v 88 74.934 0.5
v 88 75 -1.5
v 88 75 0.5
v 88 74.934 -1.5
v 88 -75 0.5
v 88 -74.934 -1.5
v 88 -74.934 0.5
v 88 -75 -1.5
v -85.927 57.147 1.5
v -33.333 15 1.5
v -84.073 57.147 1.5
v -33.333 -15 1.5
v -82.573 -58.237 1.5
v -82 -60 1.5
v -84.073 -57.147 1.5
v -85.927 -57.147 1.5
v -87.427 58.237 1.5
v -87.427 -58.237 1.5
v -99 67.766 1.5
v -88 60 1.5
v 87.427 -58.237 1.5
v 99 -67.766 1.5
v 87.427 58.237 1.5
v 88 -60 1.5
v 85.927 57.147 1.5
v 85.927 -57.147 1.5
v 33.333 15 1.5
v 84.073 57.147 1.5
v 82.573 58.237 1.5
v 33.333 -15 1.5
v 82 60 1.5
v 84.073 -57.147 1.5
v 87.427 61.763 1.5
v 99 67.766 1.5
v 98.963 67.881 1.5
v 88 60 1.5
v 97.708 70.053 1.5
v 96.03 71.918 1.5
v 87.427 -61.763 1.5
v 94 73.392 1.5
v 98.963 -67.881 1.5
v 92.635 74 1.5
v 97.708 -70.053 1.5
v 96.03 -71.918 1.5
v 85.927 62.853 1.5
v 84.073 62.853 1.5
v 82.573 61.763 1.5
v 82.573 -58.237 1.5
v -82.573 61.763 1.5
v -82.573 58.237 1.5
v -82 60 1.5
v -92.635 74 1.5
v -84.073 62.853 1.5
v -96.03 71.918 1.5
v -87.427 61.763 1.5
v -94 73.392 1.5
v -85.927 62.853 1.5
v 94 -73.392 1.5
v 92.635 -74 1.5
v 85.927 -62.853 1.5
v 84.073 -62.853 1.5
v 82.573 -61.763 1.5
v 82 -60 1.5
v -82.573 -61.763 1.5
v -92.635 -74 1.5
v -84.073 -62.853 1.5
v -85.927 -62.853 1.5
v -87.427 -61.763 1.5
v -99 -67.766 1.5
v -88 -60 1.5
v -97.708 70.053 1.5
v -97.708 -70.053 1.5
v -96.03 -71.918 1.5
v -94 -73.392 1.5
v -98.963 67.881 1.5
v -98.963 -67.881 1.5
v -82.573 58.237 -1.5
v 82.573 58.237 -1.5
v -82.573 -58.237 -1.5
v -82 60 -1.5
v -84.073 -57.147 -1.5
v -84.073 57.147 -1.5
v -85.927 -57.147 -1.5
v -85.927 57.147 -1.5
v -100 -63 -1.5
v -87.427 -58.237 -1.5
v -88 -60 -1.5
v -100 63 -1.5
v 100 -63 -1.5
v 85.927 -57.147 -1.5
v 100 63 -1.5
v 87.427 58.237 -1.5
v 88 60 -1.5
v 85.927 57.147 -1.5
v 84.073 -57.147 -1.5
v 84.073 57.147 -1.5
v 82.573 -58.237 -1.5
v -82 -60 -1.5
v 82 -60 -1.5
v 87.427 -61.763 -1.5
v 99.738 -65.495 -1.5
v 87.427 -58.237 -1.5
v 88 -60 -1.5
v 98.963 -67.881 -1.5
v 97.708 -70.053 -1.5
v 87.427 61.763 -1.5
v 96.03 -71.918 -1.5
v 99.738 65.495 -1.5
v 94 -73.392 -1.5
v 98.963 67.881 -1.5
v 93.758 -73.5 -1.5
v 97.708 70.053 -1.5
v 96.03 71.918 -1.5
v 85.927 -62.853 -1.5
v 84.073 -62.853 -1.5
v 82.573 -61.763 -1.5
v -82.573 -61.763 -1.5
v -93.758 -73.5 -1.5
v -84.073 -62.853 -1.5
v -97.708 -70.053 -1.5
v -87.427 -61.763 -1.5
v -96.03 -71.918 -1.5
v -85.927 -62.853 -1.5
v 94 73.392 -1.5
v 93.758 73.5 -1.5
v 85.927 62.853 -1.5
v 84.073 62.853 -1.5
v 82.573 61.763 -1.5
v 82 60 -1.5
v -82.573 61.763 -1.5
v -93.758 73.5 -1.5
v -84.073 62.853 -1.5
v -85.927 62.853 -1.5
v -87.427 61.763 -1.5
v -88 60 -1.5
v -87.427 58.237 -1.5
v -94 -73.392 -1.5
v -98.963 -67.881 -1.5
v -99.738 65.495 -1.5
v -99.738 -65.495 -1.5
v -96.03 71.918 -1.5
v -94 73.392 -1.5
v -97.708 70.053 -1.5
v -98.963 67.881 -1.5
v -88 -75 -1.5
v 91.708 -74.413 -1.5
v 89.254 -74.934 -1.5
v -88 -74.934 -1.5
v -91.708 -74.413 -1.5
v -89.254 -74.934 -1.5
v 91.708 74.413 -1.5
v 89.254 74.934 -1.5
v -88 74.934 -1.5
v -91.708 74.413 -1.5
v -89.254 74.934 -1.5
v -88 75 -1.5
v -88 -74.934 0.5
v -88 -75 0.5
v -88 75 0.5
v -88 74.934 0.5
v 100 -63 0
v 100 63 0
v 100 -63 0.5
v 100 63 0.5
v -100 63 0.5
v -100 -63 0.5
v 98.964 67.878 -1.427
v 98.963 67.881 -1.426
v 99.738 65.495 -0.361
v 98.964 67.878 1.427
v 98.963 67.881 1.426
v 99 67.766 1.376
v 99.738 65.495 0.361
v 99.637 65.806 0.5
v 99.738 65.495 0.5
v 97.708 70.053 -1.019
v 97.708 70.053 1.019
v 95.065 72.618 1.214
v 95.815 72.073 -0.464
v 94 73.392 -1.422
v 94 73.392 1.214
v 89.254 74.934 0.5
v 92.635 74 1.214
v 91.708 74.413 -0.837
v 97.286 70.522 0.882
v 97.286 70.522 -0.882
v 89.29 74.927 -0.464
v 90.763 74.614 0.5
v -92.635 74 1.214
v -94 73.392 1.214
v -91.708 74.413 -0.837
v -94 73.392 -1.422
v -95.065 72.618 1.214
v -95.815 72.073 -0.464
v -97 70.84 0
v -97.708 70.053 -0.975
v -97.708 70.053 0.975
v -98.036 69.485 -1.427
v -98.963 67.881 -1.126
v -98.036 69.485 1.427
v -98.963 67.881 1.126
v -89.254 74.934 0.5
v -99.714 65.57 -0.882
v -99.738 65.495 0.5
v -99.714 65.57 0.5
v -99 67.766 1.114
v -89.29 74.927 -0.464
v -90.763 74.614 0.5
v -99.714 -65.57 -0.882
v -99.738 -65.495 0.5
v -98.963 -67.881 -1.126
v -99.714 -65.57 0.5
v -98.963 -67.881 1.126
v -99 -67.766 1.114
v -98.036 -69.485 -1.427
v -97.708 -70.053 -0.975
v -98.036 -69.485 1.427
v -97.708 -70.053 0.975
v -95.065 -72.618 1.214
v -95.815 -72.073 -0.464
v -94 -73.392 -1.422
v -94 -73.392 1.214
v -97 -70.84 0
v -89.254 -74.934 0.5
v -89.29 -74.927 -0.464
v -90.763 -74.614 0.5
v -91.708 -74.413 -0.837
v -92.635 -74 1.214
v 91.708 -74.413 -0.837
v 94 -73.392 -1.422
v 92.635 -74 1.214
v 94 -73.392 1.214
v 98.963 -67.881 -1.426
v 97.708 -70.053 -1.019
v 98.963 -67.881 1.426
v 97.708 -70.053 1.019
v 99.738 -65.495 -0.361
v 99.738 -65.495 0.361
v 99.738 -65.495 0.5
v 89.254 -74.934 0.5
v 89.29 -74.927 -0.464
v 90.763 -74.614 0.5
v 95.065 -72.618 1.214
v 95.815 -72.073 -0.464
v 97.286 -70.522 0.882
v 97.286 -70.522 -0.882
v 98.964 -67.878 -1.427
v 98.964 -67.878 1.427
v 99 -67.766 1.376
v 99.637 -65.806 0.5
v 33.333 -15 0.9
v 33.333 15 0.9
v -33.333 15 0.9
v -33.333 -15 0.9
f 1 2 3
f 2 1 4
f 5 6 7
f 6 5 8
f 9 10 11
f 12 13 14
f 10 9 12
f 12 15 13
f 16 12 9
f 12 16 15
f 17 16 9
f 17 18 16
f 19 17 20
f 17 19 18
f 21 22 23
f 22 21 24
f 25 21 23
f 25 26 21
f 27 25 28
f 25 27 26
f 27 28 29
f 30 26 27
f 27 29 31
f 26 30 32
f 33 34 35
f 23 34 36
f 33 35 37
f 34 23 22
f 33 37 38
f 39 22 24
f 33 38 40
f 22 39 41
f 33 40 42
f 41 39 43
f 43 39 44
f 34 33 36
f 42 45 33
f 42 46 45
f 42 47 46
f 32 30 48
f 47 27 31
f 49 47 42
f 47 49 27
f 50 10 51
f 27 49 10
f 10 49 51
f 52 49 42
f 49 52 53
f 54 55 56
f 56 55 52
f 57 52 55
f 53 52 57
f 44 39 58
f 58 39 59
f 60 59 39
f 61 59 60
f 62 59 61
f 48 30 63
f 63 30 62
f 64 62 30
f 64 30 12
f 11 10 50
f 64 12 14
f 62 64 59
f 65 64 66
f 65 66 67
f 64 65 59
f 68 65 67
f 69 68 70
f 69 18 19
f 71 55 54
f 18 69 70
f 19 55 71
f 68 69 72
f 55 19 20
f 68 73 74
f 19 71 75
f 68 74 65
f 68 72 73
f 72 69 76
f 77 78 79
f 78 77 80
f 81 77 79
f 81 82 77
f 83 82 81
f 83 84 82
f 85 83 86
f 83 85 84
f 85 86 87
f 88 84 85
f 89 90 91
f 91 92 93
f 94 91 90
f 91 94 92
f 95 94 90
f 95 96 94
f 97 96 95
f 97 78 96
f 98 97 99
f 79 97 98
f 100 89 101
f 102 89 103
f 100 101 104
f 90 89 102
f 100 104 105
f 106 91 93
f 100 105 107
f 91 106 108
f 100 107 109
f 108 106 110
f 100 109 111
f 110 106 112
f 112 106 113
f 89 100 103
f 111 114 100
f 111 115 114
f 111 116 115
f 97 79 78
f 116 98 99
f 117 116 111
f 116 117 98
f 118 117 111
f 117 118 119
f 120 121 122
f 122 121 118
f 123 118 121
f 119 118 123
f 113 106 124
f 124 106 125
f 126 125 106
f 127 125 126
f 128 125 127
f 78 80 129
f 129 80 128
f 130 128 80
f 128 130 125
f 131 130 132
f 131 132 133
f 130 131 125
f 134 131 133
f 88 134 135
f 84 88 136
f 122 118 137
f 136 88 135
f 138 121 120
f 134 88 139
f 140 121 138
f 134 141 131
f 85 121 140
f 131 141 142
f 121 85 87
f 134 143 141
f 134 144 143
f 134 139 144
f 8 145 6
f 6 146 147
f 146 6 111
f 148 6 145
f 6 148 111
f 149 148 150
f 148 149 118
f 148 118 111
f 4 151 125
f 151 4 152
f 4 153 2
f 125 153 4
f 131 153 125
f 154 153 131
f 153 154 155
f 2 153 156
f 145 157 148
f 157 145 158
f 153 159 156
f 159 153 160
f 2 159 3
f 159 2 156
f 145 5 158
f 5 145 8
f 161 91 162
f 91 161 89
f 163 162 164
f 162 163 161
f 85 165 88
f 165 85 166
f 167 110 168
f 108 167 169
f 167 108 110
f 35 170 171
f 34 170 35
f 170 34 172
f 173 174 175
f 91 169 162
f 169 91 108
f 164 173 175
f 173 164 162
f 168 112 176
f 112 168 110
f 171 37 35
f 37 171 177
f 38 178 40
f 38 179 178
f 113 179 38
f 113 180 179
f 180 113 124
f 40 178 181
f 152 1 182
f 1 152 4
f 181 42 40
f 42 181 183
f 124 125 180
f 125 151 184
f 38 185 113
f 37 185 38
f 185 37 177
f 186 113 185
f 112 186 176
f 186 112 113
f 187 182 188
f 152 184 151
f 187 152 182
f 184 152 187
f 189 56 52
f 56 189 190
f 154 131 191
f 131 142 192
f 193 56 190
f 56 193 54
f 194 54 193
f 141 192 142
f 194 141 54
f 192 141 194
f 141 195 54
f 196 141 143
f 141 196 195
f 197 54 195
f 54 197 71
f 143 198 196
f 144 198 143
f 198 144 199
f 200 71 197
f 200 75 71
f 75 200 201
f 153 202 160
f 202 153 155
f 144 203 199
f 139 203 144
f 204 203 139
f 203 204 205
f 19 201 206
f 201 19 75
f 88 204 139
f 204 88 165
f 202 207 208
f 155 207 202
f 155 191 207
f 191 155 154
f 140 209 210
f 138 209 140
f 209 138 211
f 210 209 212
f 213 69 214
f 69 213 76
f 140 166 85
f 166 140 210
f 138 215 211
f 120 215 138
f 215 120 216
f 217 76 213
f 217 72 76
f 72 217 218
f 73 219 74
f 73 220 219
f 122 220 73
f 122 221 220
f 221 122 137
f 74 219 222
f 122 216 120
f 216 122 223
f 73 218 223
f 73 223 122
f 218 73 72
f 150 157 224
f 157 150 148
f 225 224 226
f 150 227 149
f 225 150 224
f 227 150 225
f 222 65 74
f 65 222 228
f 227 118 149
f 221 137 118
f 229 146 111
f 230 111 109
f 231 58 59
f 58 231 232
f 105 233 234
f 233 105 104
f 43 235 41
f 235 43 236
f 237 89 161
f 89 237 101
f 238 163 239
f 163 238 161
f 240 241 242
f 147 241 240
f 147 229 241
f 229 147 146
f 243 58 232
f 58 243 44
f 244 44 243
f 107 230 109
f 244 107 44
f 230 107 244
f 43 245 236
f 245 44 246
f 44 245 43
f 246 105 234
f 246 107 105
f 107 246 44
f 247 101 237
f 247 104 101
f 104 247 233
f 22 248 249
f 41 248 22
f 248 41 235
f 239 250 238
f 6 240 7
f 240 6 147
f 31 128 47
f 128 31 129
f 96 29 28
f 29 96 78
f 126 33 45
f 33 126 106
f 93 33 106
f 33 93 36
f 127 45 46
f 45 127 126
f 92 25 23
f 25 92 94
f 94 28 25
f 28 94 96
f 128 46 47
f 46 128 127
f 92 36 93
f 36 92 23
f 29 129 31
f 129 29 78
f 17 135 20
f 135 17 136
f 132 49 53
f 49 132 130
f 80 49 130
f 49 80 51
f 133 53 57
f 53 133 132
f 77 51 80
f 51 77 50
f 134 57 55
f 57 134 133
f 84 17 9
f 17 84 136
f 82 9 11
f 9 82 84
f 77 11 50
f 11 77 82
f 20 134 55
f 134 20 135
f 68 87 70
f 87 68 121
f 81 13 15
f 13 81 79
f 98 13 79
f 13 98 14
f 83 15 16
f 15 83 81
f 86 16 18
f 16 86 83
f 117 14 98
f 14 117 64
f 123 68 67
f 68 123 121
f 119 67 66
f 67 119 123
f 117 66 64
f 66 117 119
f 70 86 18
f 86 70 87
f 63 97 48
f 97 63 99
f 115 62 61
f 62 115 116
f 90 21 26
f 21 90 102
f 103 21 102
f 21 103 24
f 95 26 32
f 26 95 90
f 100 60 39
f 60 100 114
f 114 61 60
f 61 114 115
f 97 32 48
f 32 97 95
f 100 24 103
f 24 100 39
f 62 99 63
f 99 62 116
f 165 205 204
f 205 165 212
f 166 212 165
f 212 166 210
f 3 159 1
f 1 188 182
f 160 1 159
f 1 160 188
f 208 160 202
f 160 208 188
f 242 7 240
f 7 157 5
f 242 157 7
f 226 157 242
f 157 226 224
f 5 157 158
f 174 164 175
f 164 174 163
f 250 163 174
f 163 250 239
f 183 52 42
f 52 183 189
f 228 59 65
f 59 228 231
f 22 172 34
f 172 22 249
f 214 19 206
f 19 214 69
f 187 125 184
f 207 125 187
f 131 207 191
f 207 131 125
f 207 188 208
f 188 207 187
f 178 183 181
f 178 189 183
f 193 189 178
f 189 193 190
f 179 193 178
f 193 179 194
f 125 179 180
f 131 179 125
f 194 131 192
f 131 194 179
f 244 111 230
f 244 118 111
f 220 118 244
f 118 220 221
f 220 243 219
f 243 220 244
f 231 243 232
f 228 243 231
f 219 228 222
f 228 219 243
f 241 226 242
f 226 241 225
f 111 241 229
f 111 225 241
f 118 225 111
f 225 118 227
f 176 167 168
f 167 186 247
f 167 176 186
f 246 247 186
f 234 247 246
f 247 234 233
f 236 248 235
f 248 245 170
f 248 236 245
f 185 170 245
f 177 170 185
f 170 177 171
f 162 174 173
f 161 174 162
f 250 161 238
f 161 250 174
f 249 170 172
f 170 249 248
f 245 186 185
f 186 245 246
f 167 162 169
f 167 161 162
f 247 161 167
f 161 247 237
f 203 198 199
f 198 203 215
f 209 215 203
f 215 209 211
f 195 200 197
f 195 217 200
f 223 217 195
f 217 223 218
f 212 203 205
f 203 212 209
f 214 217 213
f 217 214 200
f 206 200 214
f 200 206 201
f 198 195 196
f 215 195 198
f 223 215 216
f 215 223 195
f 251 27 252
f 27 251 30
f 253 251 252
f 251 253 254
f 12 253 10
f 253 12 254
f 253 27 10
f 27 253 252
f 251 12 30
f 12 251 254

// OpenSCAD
// Parameters
sheet_length = 200; //[100:400:1]
sheet_width = 150; //[75:300:1]
sheet_thickness = 3; //[1.5:6:0.5]
corner_radius = 12; //[6:24:1]
hole_diameter = 6; //[3:12:0.5]
hole_edge_offset = 15; //[8:30:1]
edge_overlap = 1; //[0.5:2:0.5]
chamfer_size = 1; //[0.5:3:0.5]
fillet_radius = 1.5; //[0.5:4:0.5]
surface_text_depth = 0.6; //[0.2:1.5:0.1]

// Base Shapes
module sheet_body() {
  cube([sheet_length, sheet_width, sheet_thickness], center=true);
}

module rounded_corners() {
  union() {
    cube([sheet_length - 2*corner_radius, sheet_width, sheet_thickness], center=true);
    cube([sheet_length, sheet_width - 2*corner_radius, sheet_thickness], center=true);
    translate([sheet_length/2 - corner_radius, sheet_width/2 - corner_radius, 0])
      cylinder(r=corner_radius, h=sheet_thickness, center=true);
    translate([-sheet_length/2 + corner_radius, sheet_width/2 - corner_radius, 0])
      cylinder(r=corner_radius, h=sheet_thickness, center=true);
    translate([-sheet_length/2 + corner_radius, -sheet_width/2 + corner_radius, 0])
      cylinder(r=corner_radius, h=sheet_thickness, center=true);
    translate([sheet_length/2 - corner_radius, -sheet_width/2 + corner_radius, 0])
      cylinder(r=corner_radius, h=sheet_thickness, center=true);
  }
}

module mounting_holes() {
  union() {
    translate([sheet_length/2 - hole_edge_offset, sheet_width/2 - hole_edge_offset, 0])
      cylinder(r=hole_diameter/2, h=sheet_thickness + 2*edge_overlap, center=true);
    translate([-sheet_length/2 + hole_edge_offset, sheet_width/2 - hole_edge_offset, 0])
      cylinder(r=hole_diameter/2, h=sheet_thickness + 2*edge_overlap, center=true);
    translate([-sheet_length/2 + hole_edge_offset, -sheet_width/2 + hole_edge_offset, 0])
      cylinder(r=hole_diameter/2, h=sheet_thickness + 2*edge_overlap, center=true);
    translate([sheet_length/2 - hole_edge_offset, -sheet_width/2 + hole_edge_offset, 0])
      cylinder(r=hole_diameter/2, h=sheet_thickness + 2*edge_overlap, center=true);
  }
}

module chamfer_edges() {
  union() {
    translate([0, sheet_width/2 - chamfer_size/2, sheet_thickness/2 - chamfer_size/2])
      cube([sheet_length + 2*edge_overlap, chamfer_size, chamfer_size], center=true);
    translate([0, -sheet_width/2 + chamfer_size/2, sheet_thickness/2 - chamfer_size/2])
      cube([sheet_length + 2*edge_overlap, chamfer_size, chamfer_size], center=true);
    translate([sheet_length/2 - chamfer_size/2, 0, sheet_thickness/2 - chamfer_size/2])
      cube([chamfer_size, sheet_width + 2*edge_overlap, chamfer_size], center=true);
    translate([-sheet_length/2 + chamfer_size/2, 0, sheet_thickness/2 - chamfer_size/2])
      cube([chamfer_size, sheet_width + 2*edge_overlap, chamfer_size], center=true);
  }
}

module fillet_edges() {
  union() {
    translate([0, sheet_width/2 - fillet_radius, sheet_thickness/2 - fillet_radius])
      rotate([0, 90, 0]) cylinder(r=fillet_radius, h=sheet_length + 2*edge_overlap, center=true);
    translate([0, -sheet_width/2 + fillet_radius, sheet_thickness/2 - fillet_radius])
      rotate([0, 90, 0]) cylinder(r=fillet_radius, h=sheet_length + 2*edge_overlap, center=true);
    translate([sheet_length/2 - fillet_radius, 0, sheet_thickness/2 - fillet_radius])
      rotate([90, 0, 0]) cylinder(r=fillet_radius, h=sheet_width + 2*edge_overlap, center=true);
    translate([-sheet_length/2 + fillet_radius, 0, sheet_thickness/2 - fillet_radius])
      rotate([90, 0, 0]) cylinder(r=fillet_radius, h=sheet_width + 2*edge_overlap, center=true);
  }
}

module surface_text() {
  translate([0, 0, sheet_thickness/2 - surface_text_depth/2])
    cube([sheet_length/3, sheet_width/5, surface_text_depth], center=true);
}

// Final Model
difference() {
  intersection() {
    sheet_body();
    rounded_corners();
  }
  mounting_holes();
  chamfer_edges();
  fillet_edges();
  surface_text();
}
